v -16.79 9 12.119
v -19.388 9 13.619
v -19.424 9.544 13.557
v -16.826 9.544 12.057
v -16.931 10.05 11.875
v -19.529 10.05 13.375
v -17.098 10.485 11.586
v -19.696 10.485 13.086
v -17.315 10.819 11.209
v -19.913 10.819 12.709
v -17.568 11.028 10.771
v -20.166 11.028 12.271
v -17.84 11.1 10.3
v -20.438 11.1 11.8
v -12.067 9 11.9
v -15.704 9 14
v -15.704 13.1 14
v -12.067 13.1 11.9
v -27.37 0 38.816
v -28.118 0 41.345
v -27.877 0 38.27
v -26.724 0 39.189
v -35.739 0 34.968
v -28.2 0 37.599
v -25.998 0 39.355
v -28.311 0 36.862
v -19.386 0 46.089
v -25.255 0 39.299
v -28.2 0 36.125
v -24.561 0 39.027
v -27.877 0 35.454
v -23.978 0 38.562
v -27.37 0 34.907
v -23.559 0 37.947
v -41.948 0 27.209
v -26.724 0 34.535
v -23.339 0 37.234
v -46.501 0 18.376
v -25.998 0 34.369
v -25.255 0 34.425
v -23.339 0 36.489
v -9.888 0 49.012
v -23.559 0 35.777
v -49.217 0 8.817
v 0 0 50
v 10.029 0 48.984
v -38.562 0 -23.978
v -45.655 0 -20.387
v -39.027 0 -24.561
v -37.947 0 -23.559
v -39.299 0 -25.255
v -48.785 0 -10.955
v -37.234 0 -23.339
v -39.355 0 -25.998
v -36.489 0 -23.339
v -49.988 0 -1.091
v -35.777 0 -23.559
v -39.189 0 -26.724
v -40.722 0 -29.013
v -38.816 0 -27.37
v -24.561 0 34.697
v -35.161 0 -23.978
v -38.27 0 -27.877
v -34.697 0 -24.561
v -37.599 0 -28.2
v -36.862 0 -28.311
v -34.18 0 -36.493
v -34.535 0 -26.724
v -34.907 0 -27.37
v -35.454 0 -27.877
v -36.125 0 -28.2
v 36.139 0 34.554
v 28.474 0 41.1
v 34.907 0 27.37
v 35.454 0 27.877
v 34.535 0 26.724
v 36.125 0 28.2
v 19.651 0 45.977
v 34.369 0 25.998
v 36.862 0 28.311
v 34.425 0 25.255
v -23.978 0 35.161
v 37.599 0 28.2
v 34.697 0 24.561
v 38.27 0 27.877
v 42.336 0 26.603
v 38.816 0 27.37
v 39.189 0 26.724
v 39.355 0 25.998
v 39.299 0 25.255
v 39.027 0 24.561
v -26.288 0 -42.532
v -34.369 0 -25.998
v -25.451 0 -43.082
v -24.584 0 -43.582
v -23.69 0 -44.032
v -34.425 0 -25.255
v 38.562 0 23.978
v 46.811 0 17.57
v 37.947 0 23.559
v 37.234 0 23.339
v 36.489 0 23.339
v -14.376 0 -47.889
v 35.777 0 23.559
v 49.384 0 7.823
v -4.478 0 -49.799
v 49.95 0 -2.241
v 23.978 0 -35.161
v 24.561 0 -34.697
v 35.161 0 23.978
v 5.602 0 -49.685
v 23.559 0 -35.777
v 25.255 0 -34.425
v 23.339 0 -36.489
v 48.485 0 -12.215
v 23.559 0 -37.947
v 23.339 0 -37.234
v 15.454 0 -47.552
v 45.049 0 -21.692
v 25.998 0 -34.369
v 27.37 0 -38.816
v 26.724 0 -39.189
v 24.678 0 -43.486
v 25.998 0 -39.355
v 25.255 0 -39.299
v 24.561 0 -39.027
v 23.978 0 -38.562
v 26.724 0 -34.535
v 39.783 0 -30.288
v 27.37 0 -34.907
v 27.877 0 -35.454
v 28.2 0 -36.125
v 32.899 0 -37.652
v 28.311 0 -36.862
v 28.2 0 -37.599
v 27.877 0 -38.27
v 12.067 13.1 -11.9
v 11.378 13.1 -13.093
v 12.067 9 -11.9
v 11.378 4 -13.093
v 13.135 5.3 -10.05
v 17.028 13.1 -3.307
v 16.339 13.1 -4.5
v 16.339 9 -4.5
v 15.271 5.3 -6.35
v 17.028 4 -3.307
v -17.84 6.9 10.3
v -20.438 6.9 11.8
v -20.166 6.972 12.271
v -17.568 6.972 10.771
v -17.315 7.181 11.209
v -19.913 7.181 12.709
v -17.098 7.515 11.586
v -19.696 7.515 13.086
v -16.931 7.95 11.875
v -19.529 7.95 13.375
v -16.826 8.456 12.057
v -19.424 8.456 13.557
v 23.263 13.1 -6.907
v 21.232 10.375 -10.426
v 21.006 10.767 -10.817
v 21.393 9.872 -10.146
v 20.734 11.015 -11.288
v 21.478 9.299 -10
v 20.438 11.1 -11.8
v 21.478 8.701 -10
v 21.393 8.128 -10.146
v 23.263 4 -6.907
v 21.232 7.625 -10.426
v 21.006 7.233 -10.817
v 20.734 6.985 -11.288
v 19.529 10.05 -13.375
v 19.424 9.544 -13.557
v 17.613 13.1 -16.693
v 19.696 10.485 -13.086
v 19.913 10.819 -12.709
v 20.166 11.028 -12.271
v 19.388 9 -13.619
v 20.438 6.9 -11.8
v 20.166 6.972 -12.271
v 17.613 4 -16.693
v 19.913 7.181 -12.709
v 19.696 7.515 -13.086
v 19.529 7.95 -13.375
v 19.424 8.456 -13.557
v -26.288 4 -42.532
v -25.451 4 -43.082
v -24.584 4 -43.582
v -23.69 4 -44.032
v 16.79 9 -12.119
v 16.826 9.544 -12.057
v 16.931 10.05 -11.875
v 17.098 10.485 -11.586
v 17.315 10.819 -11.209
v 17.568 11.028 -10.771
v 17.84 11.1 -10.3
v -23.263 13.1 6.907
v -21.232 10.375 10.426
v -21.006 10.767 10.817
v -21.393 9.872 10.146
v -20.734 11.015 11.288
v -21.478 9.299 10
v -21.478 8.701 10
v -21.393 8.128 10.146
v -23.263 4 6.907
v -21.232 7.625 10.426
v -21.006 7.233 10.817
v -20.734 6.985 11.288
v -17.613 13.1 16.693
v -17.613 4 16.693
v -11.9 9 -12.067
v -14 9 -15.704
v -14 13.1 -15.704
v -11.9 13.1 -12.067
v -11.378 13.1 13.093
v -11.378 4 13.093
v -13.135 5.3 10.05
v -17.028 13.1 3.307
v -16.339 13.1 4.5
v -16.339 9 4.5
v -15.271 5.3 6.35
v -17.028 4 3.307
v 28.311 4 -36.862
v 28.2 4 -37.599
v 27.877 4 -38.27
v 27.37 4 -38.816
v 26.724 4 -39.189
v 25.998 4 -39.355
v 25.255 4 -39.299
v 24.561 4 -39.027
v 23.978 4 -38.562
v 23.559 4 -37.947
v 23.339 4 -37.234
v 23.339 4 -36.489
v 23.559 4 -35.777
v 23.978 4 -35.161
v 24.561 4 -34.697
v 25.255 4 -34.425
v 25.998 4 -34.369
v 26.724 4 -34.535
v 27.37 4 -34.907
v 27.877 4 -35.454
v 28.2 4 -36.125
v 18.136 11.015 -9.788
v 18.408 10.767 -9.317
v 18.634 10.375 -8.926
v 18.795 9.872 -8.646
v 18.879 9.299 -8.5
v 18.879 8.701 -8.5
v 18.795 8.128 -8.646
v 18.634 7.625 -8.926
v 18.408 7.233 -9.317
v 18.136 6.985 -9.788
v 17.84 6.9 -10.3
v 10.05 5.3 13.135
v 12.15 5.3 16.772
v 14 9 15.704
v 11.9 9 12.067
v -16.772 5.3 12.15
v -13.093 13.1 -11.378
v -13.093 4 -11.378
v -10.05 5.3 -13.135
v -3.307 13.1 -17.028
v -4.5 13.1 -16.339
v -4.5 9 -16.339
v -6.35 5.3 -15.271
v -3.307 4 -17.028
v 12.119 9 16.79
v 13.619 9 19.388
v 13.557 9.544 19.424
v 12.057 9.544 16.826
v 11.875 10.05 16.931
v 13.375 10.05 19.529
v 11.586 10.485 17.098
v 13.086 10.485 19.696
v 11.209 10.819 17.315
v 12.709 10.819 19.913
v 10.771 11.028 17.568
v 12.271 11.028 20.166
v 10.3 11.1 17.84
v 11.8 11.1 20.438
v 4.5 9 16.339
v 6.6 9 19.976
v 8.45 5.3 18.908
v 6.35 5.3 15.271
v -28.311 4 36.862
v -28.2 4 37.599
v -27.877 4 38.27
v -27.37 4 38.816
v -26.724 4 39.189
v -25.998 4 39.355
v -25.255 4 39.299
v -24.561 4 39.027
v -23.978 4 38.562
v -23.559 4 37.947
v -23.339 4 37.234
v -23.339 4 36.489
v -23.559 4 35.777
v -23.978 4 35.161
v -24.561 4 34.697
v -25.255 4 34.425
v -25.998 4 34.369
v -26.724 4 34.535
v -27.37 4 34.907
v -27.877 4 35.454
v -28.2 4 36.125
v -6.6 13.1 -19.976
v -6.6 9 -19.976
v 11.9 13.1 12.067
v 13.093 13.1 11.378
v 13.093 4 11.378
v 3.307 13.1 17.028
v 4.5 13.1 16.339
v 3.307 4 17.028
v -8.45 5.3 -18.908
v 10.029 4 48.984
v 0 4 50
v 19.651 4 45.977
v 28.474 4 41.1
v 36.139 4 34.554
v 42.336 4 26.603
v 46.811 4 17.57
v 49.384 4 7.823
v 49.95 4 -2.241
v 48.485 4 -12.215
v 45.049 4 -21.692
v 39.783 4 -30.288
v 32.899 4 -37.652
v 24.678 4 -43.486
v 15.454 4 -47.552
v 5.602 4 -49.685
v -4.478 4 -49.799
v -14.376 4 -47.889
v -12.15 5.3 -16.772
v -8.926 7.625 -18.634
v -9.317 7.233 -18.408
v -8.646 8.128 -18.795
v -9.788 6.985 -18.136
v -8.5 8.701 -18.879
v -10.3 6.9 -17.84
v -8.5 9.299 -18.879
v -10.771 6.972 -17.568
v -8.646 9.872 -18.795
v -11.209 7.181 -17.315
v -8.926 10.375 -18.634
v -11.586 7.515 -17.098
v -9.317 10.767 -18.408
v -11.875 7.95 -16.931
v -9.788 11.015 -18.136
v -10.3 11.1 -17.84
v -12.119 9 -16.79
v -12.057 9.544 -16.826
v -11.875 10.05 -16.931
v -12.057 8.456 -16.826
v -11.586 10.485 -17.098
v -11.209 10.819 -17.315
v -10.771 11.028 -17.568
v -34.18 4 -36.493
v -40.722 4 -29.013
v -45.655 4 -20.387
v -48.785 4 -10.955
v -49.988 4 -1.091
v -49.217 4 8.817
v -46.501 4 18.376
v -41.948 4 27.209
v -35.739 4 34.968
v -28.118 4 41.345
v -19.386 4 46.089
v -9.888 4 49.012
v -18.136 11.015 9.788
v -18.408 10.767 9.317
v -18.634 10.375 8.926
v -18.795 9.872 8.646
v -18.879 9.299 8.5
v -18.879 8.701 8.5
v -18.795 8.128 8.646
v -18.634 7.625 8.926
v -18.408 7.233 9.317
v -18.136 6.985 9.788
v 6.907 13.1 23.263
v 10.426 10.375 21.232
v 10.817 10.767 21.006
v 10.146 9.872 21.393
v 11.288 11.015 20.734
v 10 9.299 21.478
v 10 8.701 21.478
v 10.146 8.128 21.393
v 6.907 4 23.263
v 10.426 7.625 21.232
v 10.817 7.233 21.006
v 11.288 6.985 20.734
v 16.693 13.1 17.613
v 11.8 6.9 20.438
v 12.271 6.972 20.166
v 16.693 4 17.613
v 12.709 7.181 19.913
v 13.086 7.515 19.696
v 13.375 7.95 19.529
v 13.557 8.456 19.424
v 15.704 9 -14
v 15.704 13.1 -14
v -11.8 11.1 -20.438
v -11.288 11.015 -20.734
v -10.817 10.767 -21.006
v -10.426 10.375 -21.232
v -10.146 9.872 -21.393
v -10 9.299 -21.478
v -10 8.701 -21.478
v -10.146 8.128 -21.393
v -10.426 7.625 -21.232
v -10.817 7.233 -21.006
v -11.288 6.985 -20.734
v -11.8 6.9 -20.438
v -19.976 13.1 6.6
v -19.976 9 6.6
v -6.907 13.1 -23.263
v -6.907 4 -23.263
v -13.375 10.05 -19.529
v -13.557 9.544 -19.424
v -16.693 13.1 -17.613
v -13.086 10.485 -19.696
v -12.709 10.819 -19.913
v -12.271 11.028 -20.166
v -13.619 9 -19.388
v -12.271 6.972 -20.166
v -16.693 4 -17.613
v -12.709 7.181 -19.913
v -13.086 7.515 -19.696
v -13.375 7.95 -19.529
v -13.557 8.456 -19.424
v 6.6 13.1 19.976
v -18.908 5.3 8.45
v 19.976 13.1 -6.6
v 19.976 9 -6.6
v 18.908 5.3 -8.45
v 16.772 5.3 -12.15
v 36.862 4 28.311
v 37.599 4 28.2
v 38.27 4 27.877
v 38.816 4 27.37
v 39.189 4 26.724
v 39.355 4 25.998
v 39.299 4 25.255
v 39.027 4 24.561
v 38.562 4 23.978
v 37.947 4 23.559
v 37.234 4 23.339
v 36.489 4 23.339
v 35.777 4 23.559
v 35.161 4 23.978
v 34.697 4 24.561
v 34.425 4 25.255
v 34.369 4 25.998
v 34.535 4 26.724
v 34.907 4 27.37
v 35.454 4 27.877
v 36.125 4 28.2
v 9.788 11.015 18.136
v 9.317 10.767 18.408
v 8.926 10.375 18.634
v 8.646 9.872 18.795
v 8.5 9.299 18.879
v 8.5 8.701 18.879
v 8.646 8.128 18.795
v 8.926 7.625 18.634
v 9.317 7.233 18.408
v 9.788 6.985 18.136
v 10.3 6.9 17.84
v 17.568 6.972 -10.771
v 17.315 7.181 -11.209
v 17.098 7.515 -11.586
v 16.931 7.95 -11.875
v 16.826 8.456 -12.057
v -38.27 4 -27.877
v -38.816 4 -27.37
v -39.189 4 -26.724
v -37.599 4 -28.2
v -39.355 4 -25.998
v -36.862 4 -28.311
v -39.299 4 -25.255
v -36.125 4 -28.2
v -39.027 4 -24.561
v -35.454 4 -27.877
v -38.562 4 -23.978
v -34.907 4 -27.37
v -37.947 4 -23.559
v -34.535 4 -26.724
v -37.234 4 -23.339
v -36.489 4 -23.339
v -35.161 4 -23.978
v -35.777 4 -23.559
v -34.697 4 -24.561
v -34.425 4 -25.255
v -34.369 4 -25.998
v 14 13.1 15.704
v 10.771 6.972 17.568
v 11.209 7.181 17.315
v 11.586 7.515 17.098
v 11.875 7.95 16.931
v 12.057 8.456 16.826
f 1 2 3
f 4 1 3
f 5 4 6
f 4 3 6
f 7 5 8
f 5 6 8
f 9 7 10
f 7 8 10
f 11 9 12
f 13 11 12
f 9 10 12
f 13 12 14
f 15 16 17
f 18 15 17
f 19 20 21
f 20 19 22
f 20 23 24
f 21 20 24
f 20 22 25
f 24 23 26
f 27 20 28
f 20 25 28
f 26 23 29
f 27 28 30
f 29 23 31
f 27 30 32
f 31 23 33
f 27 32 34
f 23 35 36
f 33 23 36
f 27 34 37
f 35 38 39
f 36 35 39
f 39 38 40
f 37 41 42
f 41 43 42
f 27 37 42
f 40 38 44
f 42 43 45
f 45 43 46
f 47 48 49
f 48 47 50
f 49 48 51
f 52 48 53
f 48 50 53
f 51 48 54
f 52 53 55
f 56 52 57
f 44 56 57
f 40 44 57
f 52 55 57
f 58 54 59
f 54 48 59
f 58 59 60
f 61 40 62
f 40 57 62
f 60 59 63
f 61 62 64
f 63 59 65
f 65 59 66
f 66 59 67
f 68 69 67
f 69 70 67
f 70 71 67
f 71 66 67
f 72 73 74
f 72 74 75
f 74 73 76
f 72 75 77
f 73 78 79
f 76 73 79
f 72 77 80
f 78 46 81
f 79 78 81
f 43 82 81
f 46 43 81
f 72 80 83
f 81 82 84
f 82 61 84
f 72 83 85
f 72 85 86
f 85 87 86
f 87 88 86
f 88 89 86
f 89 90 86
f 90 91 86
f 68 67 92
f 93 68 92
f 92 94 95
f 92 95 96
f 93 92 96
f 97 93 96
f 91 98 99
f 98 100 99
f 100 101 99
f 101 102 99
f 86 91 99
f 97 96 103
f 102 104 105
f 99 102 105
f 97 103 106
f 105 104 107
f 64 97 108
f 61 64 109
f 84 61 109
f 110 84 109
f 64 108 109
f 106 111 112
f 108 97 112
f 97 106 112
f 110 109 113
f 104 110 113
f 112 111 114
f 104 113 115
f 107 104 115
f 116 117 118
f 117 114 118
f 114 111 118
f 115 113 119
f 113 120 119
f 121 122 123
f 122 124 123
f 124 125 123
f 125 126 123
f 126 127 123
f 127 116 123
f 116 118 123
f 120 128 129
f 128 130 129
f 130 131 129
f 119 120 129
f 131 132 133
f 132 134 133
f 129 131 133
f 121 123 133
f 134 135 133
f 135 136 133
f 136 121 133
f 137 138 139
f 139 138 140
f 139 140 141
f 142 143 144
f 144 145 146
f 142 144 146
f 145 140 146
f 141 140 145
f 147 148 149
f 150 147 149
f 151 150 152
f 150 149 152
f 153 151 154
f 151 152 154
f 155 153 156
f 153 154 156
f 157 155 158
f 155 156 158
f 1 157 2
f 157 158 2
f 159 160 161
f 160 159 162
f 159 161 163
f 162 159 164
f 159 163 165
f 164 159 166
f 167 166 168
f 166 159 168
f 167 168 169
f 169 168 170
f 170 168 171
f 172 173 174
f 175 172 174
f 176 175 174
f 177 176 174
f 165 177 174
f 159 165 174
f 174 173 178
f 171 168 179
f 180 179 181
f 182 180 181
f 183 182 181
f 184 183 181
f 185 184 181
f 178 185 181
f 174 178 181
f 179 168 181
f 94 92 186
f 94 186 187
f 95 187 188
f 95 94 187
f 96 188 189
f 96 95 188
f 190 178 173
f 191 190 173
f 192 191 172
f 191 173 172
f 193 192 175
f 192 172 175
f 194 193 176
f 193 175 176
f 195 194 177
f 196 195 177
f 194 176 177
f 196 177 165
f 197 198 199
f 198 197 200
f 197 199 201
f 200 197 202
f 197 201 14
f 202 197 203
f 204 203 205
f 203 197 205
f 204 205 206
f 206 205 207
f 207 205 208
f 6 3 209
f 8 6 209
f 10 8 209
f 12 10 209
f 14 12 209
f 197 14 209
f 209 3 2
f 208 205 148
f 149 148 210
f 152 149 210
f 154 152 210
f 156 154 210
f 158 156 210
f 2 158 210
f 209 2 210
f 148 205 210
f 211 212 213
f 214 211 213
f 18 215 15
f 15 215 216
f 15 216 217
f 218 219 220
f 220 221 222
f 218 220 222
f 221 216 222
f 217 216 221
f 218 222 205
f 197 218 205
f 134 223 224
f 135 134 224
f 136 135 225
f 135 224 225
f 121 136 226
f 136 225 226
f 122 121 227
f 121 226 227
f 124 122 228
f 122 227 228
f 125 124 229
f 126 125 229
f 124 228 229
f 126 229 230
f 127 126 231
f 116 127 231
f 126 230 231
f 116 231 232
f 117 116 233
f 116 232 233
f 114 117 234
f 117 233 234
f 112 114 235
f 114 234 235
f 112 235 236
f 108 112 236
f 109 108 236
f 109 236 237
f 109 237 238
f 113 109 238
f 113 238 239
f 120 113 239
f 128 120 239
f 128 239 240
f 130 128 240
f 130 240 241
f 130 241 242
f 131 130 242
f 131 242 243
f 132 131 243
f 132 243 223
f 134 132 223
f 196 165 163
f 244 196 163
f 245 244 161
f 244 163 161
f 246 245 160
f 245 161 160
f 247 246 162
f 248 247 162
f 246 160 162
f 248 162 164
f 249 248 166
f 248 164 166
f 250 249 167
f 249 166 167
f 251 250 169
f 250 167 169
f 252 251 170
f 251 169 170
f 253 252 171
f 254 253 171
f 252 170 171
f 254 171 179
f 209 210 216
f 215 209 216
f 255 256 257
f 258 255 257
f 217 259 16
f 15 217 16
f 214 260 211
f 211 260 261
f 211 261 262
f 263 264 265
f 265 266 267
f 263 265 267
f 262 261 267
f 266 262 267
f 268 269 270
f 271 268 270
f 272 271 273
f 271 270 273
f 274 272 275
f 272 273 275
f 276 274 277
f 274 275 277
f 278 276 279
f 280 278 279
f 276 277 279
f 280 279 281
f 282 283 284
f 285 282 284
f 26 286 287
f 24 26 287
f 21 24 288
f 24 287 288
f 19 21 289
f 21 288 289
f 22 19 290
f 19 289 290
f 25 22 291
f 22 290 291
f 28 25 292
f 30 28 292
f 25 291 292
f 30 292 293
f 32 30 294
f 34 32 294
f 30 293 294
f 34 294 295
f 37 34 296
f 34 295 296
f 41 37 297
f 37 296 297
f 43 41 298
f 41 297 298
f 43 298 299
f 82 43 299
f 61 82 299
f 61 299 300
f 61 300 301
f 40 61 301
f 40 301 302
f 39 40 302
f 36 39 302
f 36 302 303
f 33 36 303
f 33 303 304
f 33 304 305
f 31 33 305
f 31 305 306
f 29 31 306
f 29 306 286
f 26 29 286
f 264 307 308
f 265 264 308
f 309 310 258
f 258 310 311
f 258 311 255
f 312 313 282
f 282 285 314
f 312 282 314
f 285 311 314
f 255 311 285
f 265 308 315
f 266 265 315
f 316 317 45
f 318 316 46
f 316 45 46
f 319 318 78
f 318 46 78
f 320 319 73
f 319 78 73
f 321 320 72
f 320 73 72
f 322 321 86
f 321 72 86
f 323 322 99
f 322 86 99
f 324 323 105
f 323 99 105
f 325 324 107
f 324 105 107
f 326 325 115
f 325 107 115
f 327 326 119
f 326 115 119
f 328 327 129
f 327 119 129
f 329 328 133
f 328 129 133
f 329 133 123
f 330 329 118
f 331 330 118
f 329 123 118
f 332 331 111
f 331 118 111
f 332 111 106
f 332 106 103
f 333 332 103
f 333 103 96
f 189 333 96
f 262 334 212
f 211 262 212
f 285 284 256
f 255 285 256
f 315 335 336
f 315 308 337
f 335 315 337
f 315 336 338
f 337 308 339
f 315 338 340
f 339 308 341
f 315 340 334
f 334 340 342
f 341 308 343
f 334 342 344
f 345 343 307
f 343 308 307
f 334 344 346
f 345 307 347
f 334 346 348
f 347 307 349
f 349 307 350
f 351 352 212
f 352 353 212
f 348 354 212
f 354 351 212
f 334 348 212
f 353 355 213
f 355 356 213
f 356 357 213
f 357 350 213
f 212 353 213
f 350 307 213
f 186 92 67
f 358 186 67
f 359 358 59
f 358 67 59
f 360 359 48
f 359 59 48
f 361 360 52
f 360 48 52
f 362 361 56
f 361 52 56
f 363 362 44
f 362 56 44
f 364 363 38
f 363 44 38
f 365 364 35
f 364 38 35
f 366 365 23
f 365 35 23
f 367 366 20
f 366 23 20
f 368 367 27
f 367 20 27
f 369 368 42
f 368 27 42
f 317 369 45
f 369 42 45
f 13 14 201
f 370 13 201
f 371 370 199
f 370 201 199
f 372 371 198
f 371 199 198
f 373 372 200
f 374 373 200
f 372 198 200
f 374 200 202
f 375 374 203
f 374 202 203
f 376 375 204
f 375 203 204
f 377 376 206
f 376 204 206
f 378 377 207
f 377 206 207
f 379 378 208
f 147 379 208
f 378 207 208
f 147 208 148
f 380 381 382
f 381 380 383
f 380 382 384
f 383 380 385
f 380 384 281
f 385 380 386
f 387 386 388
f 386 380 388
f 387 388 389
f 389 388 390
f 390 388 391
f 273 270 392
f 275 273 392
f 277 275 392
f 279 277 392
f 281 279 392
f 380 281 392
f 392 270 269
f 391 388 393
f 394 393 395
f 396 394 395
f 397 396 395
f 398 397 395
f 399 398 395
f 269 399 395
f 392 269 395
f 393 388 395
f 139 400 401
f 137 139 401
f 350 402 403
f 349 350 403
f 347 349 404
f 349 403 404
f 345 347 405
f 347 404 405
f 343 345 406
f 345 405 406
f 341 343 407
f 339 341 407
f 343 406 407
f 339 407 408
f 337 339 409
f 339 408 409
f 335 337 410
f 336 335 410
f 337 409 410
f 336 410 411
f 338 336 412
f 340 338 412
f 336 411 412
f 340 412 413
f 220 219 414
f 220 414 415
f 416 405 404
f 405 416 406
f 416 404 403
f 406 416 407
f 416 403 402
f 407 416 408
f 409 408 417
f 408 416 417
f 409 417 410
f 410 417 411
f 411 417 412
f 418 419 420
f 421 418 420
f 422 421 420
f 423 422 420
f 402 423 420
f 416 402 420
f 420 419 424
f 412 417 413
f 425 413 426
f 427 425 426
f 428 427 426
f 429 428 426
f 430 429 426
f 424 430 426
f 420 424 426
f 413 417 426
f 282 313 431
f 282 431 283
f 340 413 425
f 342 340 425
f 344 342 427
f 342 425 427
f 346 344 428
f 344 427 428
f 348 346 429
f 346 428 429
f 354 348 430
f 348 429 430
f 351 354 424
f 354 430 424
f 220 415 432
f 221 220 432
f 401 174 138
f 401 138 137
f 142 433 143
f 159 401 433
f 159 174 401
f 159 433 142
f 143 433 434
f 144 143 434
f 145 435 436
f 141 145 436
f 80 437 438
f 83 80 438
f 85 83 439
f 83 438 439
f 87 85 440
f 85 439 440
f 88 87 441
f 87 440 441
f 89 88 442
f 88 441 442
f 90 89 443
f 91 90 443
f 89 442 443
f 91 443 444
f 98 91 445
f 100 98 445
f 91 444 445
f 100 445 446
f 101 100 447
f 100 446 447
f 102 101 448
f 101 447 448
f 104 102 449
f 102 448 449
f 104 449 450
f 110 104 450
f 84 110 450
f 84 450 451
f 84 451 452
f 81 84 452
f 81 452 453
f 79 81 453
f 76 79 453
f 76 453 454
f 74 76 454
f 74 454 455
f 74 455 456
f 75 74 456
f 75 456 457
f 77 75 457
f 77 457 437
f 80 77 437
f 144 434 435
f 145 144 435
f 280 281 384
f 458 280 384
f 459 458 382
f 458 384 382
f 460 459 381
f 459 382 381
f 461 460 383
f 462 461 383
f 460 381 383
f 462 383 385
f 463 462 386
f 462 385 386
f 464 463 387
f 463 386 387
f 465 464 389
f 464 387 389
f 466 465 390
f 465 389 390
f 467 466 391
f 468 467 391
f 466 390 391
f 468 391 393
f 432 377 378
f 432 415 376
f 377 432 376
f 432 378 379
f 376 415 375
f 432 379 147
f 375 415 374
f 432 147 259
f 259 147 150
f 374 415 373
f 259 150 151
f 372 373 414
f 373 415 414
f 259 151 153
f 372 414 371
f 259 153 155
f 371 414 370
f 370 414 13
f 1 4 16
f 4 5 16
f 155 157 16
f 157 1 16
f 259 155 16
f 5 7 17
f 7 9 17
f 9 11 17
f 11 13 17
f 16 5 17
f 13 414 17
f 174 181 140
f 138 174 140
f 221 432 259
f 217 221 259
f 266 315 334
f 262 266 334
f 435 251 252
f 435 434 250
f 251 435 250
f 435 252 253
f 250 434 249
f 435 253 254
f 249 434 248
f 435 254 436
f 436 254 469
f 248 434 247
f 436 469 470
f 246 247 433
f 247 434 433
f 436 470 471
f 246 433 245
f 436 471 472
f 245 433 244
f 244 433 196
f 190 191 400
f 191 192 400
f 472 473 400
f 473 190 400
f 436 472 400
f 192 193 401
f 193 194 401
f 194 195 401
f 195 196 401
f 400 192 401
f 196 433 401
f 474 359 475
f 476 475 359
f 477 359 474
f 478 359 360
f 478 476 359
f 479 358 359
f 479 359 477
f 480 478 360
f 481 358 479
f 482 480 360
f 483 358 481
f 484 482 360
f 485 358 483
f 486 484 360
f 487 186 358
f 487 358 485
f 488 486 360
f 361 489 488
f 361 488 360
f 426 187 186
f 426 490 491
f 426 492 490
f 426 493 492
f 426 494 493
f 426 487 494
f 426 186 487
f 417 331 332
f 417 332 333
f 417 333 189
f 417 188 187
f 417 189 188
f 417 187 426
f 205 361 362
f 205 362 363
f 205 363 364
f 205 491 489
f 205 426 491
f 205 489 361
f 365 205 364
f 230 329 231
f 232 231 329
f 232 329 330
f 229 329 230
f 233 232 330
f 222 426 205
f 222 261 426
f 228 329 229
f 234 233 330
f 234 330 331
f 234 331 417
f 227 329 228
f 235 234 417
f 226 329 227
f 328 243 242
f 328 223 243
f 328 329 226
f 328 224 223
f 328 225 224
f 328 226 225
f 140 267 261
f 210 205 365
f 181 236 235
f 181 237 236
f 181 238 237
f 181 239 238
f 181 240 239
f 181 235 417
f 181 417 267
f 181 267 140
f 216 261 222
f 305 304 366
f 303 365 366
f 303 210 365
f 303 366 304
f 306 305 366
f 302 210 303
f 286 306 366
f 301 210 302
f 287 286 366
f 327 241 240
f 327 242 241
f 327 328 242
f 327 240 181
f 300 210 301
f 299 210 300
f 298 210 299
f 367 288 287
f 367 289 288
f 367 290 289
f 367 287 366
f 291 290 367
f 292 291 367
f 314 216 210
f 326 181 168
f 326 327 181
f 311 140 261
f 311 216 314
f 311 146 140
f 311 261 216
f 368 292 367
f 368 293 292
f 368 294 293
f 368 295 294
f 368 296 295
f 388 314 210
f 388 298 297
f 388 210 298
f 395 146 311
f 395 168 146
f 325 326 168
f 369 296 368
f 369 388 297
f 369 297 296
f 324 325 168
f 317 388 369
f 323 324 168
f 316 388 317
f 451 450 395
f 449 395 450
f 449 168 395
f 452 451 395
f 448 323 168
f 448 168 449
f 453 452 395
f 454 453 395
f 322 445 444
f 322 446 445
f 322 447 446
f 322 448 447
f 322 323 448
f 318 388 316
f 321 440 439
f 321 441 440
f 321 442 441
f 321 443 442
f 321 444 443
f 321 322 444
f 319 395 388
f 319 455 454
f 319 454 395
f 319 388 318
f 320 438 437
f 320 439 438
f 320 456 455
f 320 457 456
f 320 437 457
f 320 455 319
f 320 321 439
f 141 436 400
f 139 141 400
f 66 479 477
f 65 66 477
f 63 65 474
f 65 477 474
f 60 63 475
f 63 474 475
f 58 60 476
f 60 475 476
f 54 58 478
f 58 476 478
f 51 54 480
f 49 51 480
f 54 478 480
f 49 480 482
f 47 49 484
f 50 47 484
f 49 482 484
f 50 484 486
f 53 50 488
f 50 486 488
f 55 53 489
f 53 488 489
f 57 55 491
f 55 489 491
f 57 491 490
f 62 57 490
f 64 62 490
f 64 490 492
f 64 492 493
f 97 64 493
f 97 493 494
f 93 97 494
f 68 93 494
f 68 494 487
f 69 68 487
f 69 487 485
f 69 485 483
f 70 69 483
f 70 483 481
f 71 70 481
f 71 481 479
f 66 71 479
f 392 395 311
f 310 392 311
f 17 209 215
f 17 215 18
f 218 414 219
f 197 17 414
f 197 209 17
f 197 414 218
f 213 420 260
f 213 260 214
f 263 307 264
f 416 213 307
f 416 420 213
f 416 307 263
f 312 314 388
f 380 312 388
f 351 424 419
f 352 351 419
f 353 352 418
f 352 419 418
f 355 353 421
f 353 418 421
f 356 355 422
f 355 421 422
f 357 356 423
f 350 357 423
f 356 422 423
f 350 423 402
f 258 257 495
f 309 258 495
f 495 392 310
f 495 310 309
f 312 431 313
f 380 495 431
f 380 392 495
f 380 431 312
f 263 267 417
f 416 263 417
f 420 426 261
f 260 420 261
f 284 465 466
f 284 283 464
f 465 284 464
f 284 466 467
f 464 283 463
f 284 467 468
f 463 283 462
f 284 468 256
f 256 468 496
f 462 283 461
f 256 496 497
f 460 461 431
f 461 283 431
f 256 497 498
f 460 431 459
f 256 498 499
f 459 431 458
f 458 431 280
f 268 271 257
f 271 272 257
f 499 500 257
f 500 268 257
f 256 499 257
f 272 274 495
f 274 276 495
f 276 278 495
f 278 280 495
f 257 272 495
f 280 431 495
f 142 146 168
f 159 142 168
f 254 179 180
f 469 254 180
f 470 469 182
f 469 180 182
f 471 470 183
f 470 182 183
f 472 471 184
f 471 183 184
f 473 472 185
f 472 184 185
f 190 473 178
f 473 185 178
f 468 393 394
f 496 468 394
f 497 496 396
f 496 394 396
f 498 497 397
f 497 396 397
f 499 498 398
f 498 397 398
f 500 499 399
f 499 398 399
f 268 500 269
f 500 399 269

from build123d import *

# Parameters (mm, degrees)
SKETCH1_R           = 50
SKETCH1_R_2         = 1.475
SKETCH1_R_3         = 2.6
BOSS_EXTRUDE1_DEPTH = 4
SKETCH2_R           = 1.5
CUT_EXTRUDE1_DEPTH  = 10
BOSS_EXTRUDE3_DEPTH = 9.1
CIRPATTERN1_COUNT   = 4
CUT_EXTRUDE2_START  = -3
CUT_EXTRUDE2_DEPTH  = 5
CUT_EXTRUDE3_DEPTH  = 15
CIRPATTERN2_COUNT   = 4
CIRPATTERN3_COUNT   = 4
BOSS_EXTRUDE4_START = -4
SKETCH11_R          = 2.6
SKETCH11_R_2        = 1.475
SKETCH11_R_3        = 2.656466029
BOSS_EXTRUDE4_DEPTH = 4
SKETCH12_R          = 2.5
CUT_EXTRUDE4_DEPTH  = 10
CIRPATTERN4_COUNT   = 4


with BuildPart() as part:
    # Sketch1 → Boss-Extrude1 (new body)
    with BuildSketch(Plane(origin=(0, 0, 0), x_dir=(1, 0, 0), z_dir=(0, 1, 0))):
        with Locations(Location((0, 0, 0), (0, 0, 270))):
            Circle(SKETCH1_R)
        with Locations(Location((0, 13, 0), (0, 0, 270))):
            Circle(SKETCH1_R_2, mode=Mode.SUBTRACT)
        with Locations(Location((11.258330249, 6.5, 0), (0, 0, 270))):
            Circle(SKETCH1_R_2, mode=Mode.SUBTRACT)
        with Locations(Location((11.258330249, -6.5, 0), (0, 0, 270))):
            Circle(SKETCH1_R_2, mode=Mode.SUBTRACT)
        with Locations(Location((0, -13, 0), (0, 0, 270))):
            Circle(SKETCH1_R_2, mode=Mode.SUBTRACT)
        with Locations(Location((-11.258330249, -6.5, 0), (0, 0, 270))):
            Circle(SKETCH1_R_2, mode=Mode.SUBTRACT)
        with Locations(Location((-11.258330249, 6.5, 0), (0, 0, 270))):
            Circle(SKETCH1_R_2, mode=Mode.SUBTRACT)
        with Locations(Location((-24.148145657, 6.470476128, 0), (0, 0, 270))):
            Circle(SKETCH1_R_3, mode=Mode.SUBTRACT)
        with Locations(Location((6.470476128, 24.148145657, 0), (0, 0, 270))):
            Circle(SKETCH1_R_3, mode=Mode.SUBTRACT)
        with Locations(Location((24.148145657, -6.470476128, 0), (0, 0, 270))):
            Circle(SKETCH1_R_3, mode=Mode.SUBTRACT)
        with Locations(Location((-6.470476128, -24.148145657, 0), (0, 0, 270))):
            Circle(SKETCH1_R_3, mode=Mode.SUBTRACT)
    extrude(amount=BOSS_EXTRUDE1_DEPTH)

    # Sketch2 → Cut-Extrude1 (cut)
    with BuildSketch(Plane(origin=(0, 4, 0), x_dir=(1, 0, 0), z_dir=(0, 1, 0))):
        with Locations((-25, 43.301270189)):
            Circle(SKETCH2_R)
    extrude(amount=-CUT_EXTRUDE1_DEPTH, mode=Mode.SUBTRACT)

    # Sketch8 → Boss-Extrude3 (add)
    with BuildSketch(Plane(origin=(0, 4, 0), x_dir=(1, 0, 0), z_dir=(0, 1, 0))):
        Polygon((-6.906956469, 23.263199529), (-11.8, 20.438199529), (-8.2, 14.202816622), (-3.306956469, 17.027816622), align=None)
        Polygon((-8.2, 14.202816622), (-11.8, 20.438199529), (-16.693043531, 17.613199529), (-13.093043531, 11.377816622), align=None)
    boss_extrude3 = extrude(amount=BOSS_EXTRUDE3_DEPTH)

    # CirPattern1: Boss-Extrude3 ×4 about axis
    cirpattern1_axis = Axis((0, 0, 0), (0, 1, 0))
    for i in range(1, CIRPATTERN1_COUNT):
        add(boss_extrude3.rotate(cirpattern1_axis, i * 360 / CIRPATTERN1_COUNT))

    # Sketch9 → Cut-Extrude2 (cut)
    with BuildSketch(Plane(origin=(-11.8, 0, -20.438199529), x_dir=(-0.8660254037844384, 0, 0.5000000000000006), z_dir=(-0.5000000000000006, 0, -0.8660254037844384)).offset(CUT_EXTRUDE2_START)):
        Polygon((0, 5.3), (0, 12.7), (-2.136195996, 12.7), (-4.272391992, 9), (-2.136195996, 5.3), align=None)
        Polygon((2.136195996, 12.7), (0, 12.7), (0, 5.3), (2.136195996, 5.3), (4.272391992, 9), align=None)
        Polygon((0, 12.7), (0, 13.1), (-4.272391992, 13.1), (-4.272391992, 9), (-2.136195996, 12.7), align=None)
        Polygon((4.272391992, 13.1), (0, 13.1), (0, 12.7), (2.136195996, 12.7), (4.272391992, 9), align=None)
    cut_extrude2 = extrude(amount=-CUT_EXTRUDE2_DEPTH, mode=Mode.SUBTRACT)

    # Sketch10 → Cut-Extrude3 (cut)
    with BuildSketch(Plane(origin=(-11.8, 0, -20.438199529), x_dir=(-0.8660254037844384, 0, 0.5000000000000006), z_dir=(-0.5000000000000006, 0, -0.8660254037844384))):
        with BuildLine():
            ThreePointArc((2.1, 9), (1.48492424, 10.48492424), (0, 11.1))
            Line((0, 11.1), (0, 6.9))
            ThreePointArc((0, 6.9), (1.48492424, 7.51507576), (2.1, 9))
        make_face()
        with BuildLine():
            Line((0, 6.9), (0, 11.1))
            ThreePointArc((0, 11.1), (-2.1, 9), (0, 6.9))
        make_face()
    cut_extrude3 = extrude(amount=-CUT_EXTRUDE3_DEPTH, mode=Mode.SUBTRACT)

    # CirPattern2: Cut-Extrude2 ×4 about axis
    cirpattern2_axis = Axis((0, 0, 0), (0, 1, 0))
    for i in range(1, CIRPATTERN2_COUNT):
        add(cut_extrude2.rotate(cirpattern2_axis, i * 360 / CIRPATTERN2_COUNT), mode=Mode.SUBTRACT)

    # CirPattern3: Cut-Extrude3 ×4 about axis
    cirpattern3_axis = Axis((0, 4, 0), (0, 1, 0))
    for i in range(1, CIRPATTERN3_COUNT):
        add(cut_extrude3.rotate(cirpattern3_axis, i * 360 / CIRPATTERN3_COUNT), mode=Mode.SUBTRACT)

    # Sketch11 → Boss-Extrude4 (add)
    with BuildSketch(Plane(origin=(0, 4, 0), x_dir=(1, 0, 0), z_dir=(0, 1, 0)).offset(BOSS_EXTRUDE4_START)):
        with Locations((-24.148145657, 6.470476128)):
            Circle(SKETCH11_R)
        with Locations((-6.470476128, -24.148145657)):
            Circle(SKETCH11_R)
        with Locations((0, -13)):
            Circle(SKETCH11_R_2)
        with Locations((-11.258330249, -6.5)):
            Circle(SKETCH11_R_2)
        with Locations((24.148145657, -6.470476128)):
            Circle(SKETCH11_R_3)
        with Locations((6.470476128, 24.148145657)):
            Circle(SKETCH11_R)
        with Locations((0, 13)):
            Circle(SKETCH11_R_2)
        with Locations((11.258330249, 6.5)):
            Circle(SKETCH11_R_2)
        with Locations((11.258330249, -6.5)):
            Circle(SKETCH11_R_2)
        with Locations((-11.258330249, 6.5)):
            Circle(SKETCH11_R_2)
        with BuildLine():
            ThreePointArc((-26.287641956, 42.531868997), (-25.021511025, 43.338528377), (-23.689858044, 44.031700238))
            ThreePointArc((-23.689858044, 44.031700238), (-24.25, 42.002232084), (-26.287641956, 42.531868997))
        make_face()
    extrude(amount=BOSS_EXTRUDE4_DEPTH)

    # Sketch12 → Cut-Extrude4 (cut)
    with BuildSketch(Plane(origin=(0, 4, 0), x_dir=(1, 0, 0), z_dir=(0, 1, 0))):
        with Locations(Location((36.861841993, -25.810939636, 0), (0, 0, 270))):
            Circle(SKETCH12_R)
    cut_extrude4 = extrude(amount=-CUT_EXTRUDE4_DEPTH, mode=Mode.SUBTRACT)

    # CirPattern4: Cut-Extrude4 ×4 about axis
    cirpattern4_axis = Axis((0, 0, 0), (0, 1, 0))
    for i in range(1, CIRPATTERN4_COUNT):
        add(cut_extrude4.rotate(cirpattern4_axis, i * 360 / CIRPATTERN4_COUNT), mode=Mode.SUBTRACT)


solid = part.part
